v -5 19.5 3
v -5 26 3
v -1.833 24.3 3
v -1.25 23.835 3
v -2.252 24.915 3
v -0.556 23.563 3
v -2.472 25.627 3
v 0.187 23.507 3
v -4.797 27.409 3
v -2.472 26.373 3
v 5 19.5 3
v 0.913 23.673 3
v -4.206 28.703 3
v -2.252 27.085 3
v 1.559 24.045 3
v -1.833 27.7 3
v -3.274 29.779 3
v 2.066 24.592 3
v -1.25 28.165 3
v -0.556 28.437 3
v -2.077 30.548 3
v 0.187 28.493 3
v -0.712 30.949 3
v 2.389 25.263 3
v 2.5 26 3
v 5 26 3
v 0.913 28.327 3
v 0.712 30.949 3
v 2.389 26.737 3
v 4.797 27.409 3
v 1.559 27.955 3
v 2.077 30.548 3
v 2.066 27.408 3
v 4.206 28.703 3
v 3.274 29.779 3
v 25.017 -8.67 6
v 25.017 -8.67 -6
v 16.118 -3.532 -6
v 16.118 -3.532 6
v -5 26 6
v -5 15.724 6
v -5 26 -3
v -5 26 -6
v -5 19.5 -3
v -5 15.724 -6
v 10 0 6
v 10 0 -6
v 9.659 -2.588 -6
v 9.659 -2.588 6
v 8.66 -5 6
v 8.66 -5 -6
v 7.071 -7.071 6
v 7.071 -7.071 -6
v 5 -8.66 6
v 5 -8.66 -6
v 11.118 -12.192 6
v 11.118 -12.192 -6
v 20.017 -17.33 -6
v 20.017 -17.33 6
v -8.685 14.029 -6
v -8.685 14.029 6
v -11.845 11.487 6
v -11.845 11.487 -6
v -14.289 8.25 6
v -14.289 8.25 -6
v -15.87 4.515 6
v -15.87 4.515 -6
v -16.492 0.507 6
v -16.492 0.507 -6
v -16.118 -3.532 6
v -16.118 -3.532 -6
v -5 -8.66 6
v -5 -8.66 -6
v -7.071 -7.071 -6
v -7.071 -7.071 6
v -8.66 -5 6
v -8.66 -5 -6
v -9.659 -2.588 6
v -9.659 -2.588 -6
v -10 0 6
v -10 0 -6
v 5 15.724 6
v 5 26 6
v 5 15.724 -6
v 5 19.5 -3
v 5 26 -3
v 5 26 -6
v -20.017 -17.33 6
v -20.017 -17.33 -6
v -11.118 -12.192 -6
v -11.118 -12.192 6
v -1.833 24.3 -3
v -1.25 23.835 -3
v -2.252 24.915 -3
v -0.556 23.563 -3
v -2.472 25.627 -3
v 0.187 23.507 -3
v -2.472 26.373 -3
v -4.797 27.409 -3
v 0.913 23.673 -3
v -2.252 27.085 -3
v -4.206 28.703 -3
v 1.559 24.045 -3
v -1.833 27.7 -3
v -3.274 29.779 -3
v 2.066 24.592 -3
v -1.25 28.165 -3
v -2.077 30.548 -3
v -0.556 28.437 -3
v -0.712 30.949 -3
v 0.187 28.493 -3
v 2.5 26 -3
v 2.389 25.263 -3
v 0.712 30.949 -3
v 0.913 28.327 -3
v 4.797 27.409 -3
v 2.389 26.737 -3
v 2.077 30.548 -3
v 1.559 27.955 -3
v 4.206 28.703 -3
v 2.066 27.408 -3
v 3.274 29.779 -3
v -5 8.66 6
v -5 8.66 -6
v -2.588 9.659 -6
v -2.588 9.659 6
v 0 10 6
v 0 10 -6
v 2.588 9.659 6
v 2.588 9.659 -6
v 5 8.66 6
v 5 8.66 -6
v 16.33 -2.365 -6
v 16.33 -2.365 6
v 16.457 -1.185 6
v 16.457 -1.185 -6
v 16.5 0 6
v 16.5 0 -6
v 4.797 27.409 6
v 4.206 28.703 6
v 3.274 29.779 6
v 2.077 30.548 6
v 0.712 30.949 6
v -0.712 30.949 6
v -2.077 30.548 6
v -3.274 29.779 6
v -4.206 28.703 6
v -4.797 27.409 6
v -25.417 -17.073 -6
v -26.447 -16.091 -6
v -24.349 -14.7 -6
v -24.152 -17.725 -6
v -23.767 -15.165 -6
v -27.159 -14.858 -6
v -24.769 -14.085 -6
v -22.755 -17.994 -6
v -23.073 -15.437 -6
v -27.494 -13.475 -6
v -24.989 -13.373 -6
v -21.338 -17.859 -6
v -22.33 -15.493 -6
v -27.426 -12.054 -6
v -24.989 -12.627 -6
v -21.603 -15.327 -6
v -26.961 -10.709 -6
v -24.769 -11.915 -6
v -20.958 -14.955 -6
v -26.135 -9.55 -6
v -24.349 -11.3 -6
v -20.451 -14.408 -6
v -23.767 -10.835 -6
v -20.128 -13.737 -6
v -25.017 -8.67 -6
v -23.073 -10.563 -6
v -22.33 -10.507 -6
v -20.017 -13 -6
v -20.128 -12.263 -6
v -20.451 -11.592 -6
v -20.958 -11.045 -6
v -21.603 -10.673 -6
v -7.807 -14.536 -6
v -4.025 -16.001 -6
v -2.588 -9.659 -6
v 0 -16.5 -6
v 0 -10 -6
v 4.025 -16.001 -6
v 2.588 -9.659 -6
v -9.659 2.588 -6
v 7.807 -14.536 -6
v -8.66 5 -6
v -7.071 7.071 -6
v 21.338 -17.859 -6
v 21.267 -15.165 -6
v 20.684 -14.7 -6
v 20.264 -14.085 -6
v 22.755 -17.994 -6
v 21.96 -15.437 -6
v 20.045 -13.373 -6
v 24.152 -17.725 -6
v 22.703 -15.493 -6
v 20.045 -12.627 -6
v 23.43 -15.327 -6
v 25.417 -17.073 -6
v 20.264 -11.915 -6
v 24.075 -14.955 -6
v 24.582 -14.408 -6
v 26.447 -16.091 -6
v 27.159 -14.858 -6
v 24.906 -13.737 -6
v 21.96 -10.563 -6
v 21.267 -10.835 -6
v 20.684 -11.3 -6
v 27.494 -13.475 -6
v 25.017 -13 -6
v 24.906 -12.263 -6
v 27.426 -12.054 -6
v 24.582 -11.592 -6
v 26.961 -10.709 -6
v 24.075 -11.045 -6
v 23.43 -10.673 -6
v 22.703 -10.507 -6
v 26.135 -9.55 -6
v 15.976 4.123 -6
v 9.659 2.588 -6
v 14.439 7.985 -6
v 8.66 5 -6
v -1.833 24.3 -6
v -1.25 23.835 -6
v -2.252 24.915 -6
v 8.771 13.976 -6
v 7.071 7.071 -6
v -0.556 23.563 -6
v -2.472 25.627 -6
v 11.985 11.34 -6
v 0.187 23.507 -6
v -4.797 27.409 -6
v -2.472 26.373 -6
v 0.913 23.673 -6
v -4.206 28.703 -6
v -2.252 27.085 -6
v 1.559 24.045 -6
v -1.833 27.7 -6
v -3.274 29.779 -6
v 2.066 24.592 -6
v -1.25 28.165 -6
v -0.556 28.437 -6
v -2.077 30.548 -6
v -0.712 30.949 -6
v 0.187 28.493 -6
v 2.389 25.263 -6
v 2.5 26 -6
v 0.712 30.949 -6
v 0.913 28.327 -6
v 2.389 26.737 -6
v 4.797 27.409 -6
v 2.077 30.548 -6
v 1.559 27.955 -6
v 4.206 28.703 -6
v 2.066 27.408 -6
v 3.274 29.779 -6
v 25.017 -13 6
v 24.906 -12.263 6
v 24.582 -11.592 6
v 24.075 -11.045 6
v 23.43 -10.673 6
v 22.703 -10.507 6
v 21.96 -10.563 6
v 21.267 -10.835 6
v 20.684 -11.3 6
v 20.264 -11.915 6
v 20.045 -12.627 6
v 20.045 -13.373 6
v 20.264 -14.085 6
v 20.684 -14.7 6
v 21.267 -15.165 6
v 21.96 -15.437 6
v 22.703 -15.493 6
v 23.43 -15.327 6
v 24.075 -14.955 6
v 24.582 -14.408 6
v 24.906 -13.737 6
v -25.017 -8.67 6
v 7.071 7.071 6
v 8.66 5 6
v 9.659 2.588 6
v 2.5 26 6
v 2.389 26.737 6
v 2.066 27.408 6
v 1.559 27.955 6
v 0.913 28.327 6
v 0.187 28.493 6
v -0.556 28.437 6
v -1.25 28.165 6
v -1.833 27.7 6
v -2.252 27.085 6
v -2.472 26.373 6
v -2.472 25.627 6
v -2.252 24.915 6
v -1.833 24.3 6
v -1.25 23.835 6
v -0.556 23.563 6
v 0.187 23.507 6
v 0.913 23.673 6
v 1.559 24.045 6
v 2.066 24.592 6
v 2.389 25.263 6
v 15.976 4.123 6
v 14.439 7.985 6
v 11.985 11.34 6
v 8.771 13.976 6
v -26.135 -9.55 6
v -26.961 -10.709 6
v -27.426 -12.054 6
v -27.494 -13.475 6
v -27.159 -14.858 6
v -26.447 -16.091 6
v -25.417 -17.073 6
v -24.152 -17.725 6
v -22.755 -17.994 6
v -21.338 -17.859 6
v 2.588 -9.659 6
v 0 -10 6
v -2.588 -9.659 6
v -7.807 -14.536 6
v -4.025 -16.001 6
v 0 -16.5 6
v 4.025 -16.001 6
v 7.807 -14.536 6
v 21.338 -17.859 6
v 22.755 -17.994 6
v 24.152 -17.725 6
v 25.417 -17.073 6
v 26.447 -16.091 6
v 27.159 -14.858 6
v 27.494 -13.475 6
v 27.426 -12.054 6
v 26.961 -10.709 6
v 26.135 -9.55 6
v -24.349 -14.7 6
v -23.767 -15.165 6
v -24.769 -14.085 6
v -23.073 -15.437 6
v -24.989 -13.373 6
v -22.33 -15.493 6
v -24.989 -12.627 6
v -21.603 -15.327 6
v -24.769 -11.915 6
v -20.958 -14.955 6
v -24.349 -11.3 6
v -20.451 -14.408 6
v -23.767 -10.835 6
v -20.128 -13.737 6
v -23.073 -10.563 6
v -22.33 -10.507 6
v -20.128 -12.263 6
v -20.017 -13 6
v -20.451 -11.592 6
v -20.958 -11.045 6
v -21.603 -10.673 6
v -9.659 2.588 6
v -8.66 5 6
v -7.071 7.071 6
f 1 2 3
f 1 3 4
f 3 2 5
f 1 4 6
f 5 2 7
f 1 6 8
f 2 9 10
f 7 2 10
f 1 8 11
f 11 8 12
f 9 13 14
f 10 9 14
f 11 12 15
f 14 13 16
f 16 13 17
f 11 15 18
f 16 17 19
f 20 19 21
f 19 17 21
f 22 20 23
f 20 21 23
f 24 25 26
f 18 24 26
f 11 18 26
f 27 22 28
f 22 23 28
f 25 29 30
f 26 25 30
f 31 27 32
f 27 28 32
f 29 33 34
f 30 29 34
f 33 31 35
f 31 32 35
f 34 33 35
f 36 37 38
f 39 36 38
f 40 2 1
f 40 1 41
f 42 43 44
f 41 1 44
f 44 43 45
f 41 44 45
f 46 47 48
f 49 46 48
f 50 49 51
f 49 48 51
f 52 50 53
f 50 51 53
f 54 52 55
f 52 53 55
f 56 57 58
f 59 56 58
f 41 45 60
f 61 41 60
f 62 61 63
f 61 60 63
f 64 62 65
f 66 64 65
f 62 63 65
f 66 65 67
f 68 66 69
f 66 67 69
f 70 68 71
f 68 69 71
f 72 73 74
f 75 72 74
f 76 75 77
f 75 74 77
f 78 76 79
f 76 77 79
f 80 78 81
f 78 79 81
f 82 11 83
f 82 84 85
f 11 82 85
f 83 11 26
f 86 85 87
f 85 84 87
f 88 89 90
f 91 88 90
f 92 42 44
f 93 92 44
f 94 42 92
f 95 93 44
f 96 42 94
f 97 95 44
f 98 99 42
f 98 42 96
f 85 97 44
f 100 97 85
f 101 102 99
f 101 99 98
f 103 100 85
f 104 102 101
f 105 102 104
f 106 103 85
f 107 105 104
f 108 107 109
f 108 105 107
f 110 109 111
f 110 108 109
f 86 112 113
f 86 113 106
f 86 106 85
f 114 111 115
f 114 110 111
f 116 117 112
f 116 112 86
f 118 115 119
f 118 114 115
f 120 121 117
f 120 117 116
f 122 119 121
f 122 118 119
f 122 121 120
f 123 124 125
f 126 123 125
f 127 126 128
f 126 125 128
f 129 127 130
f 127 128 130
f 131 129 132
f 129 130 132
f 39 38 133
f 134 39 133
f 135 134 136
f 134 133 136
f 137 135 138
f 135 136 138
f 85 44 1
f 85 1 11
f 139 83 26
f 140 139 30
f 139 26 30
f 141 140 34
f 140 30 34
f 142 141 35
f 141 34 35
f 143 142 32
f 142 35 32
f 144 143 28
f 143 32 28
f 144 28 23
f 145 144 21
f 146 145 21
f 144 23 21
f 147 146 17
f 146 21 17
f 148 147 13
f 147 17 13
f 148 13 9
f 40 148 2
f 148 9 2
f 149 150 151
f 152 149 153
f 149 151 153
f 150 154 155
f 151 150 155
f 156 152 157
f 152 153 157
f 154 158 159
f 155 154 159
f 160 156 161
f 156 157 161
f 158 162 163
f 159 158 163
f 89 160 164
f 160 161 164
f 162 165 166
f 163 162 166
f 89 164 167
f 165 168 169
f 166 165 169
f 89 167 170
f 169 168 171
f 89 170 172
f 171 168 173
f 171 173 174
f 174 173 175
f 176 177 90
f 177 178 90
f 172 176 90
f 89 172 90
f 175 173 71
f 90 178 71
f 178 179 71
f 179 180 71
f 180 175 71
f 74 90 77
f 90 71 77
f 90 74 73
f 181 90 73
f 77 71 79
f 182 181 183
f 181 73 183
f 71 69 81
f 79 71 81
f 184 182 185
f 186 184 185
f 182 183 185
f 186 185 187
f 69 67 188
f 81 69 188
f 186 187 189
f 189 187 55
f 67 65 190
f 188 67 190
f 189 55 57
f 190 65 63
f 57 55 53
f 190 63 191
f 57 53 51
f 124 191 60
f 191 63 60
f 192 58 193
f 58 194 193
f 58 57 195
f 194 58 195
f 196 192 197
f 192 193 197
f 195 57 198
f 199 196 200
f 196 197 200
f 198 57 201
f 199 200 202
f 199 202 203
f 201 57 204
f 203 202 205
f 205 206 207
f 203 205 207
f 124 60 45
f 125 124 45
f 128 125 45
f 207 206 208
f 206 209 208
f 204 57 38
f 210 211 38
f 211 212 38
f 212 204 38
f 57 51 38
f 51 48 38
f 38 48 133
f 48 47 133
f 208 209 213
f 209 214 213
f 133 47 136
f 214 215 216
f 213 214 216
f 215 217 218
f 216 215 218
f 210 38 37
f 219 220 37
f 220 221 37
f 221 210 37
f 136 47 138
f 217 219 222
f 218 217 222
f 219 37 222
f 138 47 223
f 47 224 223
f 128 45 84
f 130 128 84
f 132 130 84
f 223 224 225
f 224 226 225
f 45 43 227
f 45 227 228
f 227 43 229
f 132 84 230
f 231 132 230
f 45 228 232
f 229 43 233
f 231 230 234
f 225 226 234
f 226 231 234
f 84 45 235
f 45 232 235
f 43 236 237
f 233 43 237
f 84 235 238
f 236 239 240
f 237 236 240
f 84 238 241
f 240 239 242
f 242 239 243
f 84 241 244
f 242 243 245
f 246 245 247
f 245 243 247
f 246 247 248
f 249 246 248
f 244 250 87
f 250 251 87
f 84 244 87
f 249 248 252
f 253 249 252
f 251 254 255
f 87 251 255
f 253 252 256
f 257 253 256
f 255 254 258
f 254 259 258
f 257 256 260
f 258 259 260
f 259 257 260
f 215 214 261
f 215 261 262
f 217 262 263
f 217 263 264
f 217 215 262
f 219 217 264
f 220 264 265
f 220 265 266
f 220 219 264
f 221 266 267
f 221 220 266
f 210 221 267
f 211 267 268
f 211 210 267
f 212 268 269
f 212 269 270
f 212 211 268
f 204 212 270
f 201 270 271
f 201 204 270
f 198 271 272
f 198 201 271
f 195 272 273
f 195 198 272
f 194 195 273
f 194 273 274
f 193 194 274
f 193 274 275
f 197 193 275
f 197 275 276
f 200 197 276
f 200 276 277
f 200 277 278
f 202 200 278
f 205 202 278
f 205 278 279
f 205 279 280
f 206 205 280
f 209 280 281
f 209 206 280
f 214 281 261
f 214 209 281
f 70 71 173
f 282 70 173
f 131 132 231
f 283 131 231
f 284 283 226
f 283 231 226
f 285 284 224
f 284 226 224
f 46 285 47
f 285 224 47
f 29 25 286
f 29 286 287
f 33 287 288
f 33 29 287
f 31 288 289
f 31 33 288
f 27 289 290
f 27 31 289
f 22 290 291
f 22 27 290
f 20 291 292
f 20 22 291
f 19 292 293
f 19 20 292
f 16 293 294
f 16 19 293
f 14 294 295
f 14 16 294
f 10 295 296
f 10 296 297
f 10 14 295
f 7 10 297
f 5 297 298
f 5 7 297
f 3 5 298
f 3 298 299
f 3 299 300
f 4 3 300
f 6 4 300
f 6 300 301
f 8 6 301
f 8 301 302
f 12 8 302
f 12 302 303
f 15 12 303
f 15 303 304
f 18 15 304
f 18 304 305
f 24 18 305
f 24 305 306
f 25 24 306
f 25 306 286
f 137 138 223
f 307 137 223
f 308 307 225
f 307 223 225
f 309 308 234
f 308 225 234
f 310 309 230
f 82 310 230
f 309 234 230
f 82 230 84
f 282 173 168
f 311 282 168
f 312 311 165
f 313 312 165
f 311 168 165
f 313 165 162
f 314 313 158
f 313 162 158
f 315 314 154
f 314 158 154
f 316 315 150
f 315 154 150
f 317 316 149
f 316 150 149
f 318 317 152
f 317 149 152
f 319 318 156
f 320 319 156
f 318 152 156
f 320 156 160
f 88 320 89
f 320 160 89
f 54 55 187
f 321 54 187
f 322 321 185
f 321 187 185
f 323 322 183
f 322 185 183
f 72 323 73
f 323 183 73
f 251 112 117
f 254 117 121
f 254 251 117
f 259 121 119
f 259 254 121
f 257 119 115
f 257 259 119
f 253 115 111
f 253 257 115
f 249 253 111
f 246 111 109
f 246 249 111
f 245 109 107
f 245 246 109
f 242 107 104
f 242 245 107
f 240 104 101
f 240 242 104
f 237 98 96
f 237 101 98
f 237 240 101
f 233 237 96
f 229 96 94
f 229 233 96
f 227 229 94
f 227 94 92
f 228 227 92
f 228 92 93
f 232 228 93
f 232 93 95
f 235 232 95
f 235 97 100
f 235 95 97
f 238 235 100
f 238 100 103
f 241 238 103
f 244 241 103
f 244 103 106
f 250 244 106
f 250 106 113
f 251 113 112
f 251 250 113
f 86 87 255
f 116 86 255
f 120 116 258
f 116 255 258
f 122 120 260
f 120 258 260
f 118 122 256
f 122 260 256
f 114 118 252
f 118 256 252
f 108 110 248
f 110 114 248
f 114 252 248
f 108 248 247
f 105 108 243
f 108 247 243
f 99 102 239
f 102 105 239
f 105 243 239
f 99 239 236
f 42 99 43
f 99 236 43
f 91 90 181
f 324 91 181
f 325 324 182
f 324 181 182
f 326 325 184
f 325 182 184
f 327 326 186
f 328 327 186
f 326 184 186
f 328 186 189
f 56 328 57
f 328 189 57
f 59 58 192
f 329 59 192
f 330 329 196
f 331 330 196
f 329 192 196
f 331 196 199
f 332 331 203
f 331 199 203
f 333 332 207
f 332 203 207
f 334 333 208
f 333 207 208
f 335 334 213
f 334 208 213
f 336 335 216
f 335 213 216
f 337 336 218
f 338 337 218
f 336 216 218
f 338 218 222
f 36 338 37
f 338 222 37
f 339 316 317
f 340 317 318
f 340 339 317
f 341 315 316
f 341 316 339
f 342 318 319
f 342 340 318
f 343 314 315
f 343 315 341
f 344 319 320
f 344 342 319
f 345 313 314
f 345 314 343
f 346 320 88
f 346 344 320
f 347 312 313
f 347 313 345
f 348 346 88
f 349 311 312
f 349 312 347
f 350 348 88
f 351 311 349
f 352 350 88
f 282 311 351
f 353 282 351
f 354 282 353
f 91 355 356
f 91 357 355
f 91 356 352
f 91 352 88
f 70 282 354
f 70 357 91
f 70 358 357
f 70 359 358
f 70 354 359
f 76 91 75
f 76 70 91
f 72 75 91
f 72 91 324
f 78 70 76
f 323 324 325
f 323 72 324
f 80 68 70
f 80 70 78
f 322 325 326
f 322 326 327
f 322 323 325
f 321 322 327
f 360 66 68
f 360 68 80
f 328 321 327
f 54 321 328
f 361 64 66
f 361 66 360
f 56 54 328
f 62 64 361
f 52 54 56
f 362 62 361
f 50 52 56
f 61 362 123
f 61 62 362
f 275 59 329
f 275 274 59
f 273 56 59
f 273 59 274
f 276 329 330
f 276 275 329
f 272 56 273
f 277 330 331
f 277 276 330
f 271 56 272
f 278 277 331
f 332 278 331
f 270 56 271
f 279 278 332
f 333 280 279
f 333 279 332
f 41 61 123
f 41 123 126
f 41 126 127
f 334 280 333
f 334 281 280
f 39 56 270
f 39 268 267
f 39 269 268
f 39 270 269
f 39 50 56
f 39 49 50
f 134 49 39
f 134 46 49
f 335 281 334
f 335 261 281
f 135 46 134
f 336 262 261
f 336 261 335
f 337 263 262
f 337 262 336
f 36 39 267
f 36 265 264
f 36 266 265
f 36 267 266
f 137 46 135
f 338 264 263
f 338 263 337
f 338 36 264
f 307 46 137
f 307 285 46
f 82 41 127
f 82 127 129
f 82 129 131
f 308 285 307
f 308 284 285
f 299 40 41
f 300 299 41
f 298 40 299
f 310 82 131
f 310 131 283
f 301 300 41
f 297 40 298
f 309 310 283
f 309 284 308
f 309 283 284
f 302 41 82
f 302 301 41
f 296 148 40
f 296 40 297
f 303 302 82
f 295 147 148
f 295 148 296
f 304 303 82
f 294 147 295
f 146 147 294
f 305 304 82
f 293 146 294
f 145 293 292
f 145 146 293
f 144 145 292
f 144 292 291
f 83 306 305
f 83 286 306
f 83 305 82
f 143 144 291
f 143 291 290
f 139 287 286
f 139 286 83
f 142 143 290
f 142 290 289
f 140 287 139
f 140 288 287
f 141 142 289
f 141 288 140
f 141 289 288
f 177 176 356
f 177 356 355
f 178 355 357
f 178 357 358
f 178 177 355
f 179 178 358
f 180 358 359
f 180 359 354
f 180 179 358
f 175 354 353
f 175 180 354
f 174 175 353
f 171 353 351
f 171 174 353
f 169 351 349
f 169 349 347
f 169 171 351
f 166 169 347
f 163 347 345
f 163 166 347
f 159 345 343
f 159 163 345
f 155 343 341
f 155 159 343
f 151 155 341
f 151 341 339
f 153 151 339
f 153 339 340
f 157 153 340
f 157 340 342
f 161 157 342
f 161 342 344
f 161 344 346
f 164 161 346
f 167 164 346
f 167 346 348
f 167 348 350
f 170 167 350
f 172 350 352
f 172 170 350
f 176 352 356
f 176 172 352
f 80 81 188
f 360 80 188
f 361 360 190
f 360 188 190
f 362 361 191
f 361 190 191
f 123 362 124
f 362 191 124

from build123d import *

# Parameters (mm, degrees)
EXTRUDE_1_DEPTH          = 6
EXTRUDE_1_DEPTH_BACK     = 6
SKETCH_1_R               = 10
SKETCH_1_R_2             = 2.5
CUT_EXTRUDE_1_DEPTH      = 3
CUT_EXTRUDE_1_DEPTH_BACK = 3
SKETCH_2_W               = 15
SKETCH_2_H               = 13


with BuildPart() as part:
    # Эскиз1 → Бобышка-Вытянуть1 (new, two sides: drawn at the far end of the back side and taken through both)
    with BuildSketch(Plane.XY.offset(-EXTRUDE_1_DEPTH_BACK)):
        with BuildLine():
            ThreePointArc((-5, 15.724185194), (-14.289419162, 8.25), (-16.117543831, -3.531965578))
            Line((-16.117543831, -3.531965578), (-25.016660498, -8.669872981))
            ThreePointArc((-25.016660498, -8.669872981), (-26.846787517, -15.5), (-20.016660498, -17.330127019))
            Line((-20.016660498, -17.330127019), (-11.117543831, -12.192219616))
            ThreePointArc((-11.117543831, -12.192219616), (0, -16.5), (11.117543831, -12.192219616))
            Line((11.117543831, -12.192219616), (20.016660498, -17.330127019))
            ThreePointArc((20.016660498, -17.330127019), (26.846787517, -15.5), (25.016660498, -8.669872981))
            Line((25.016660498, -8.669872981), (16.117543831, -3.531965578))
            ThreePointArc((16.117543831, -3.531965578), (14.289419162, 8.25), (5, 15.724185194))
            Line((5, 15.724185194), (5, 26))
            ThreePointArc((5, 26), (0, 31), (-5, 26))
            Line((-5, 26), (-5, 15.724185194))
        make_face()
        Circle(SKETCH_1_R, mode=Mode.SUBTRACT)
        with Locations((-22.516660498, -13)):
            Circle(SKETCH_1_R_2, mode=Mode.SUBTRACT)
        with Locations((0, 26)):
            Circle(SKETCH_1_R_2, mode=Mode.SUBTRACT)
        with Locations((22.516660498, -13)):
            Circle(SKETCH_1_R_2, mode=Mode.SUBTRACT)
    extrude(amount=EXTRUDE_1_DEPTH + EXTRUDE_1_DEPTH_BACK)

    # Эскиз2 → Вырез-Вытянуть1 (cut, two sides: drawn at the far end of the back side and taken through both)
    with BuildSketch(Plane.XY.offset(-CUT_EXTRUDE_1_DEPTH_BACK)):
        with Locations((0, 26)):
            Rectangle(SKETCH_2_W, SKETCH_2_H)
    extrude(amount=CUT_EXTRUDE_1_DEPTH + CUT_EXTRUDE_1_DEPTH_BACK, mode=Mode.SUBTRACT)


solid = part.part
